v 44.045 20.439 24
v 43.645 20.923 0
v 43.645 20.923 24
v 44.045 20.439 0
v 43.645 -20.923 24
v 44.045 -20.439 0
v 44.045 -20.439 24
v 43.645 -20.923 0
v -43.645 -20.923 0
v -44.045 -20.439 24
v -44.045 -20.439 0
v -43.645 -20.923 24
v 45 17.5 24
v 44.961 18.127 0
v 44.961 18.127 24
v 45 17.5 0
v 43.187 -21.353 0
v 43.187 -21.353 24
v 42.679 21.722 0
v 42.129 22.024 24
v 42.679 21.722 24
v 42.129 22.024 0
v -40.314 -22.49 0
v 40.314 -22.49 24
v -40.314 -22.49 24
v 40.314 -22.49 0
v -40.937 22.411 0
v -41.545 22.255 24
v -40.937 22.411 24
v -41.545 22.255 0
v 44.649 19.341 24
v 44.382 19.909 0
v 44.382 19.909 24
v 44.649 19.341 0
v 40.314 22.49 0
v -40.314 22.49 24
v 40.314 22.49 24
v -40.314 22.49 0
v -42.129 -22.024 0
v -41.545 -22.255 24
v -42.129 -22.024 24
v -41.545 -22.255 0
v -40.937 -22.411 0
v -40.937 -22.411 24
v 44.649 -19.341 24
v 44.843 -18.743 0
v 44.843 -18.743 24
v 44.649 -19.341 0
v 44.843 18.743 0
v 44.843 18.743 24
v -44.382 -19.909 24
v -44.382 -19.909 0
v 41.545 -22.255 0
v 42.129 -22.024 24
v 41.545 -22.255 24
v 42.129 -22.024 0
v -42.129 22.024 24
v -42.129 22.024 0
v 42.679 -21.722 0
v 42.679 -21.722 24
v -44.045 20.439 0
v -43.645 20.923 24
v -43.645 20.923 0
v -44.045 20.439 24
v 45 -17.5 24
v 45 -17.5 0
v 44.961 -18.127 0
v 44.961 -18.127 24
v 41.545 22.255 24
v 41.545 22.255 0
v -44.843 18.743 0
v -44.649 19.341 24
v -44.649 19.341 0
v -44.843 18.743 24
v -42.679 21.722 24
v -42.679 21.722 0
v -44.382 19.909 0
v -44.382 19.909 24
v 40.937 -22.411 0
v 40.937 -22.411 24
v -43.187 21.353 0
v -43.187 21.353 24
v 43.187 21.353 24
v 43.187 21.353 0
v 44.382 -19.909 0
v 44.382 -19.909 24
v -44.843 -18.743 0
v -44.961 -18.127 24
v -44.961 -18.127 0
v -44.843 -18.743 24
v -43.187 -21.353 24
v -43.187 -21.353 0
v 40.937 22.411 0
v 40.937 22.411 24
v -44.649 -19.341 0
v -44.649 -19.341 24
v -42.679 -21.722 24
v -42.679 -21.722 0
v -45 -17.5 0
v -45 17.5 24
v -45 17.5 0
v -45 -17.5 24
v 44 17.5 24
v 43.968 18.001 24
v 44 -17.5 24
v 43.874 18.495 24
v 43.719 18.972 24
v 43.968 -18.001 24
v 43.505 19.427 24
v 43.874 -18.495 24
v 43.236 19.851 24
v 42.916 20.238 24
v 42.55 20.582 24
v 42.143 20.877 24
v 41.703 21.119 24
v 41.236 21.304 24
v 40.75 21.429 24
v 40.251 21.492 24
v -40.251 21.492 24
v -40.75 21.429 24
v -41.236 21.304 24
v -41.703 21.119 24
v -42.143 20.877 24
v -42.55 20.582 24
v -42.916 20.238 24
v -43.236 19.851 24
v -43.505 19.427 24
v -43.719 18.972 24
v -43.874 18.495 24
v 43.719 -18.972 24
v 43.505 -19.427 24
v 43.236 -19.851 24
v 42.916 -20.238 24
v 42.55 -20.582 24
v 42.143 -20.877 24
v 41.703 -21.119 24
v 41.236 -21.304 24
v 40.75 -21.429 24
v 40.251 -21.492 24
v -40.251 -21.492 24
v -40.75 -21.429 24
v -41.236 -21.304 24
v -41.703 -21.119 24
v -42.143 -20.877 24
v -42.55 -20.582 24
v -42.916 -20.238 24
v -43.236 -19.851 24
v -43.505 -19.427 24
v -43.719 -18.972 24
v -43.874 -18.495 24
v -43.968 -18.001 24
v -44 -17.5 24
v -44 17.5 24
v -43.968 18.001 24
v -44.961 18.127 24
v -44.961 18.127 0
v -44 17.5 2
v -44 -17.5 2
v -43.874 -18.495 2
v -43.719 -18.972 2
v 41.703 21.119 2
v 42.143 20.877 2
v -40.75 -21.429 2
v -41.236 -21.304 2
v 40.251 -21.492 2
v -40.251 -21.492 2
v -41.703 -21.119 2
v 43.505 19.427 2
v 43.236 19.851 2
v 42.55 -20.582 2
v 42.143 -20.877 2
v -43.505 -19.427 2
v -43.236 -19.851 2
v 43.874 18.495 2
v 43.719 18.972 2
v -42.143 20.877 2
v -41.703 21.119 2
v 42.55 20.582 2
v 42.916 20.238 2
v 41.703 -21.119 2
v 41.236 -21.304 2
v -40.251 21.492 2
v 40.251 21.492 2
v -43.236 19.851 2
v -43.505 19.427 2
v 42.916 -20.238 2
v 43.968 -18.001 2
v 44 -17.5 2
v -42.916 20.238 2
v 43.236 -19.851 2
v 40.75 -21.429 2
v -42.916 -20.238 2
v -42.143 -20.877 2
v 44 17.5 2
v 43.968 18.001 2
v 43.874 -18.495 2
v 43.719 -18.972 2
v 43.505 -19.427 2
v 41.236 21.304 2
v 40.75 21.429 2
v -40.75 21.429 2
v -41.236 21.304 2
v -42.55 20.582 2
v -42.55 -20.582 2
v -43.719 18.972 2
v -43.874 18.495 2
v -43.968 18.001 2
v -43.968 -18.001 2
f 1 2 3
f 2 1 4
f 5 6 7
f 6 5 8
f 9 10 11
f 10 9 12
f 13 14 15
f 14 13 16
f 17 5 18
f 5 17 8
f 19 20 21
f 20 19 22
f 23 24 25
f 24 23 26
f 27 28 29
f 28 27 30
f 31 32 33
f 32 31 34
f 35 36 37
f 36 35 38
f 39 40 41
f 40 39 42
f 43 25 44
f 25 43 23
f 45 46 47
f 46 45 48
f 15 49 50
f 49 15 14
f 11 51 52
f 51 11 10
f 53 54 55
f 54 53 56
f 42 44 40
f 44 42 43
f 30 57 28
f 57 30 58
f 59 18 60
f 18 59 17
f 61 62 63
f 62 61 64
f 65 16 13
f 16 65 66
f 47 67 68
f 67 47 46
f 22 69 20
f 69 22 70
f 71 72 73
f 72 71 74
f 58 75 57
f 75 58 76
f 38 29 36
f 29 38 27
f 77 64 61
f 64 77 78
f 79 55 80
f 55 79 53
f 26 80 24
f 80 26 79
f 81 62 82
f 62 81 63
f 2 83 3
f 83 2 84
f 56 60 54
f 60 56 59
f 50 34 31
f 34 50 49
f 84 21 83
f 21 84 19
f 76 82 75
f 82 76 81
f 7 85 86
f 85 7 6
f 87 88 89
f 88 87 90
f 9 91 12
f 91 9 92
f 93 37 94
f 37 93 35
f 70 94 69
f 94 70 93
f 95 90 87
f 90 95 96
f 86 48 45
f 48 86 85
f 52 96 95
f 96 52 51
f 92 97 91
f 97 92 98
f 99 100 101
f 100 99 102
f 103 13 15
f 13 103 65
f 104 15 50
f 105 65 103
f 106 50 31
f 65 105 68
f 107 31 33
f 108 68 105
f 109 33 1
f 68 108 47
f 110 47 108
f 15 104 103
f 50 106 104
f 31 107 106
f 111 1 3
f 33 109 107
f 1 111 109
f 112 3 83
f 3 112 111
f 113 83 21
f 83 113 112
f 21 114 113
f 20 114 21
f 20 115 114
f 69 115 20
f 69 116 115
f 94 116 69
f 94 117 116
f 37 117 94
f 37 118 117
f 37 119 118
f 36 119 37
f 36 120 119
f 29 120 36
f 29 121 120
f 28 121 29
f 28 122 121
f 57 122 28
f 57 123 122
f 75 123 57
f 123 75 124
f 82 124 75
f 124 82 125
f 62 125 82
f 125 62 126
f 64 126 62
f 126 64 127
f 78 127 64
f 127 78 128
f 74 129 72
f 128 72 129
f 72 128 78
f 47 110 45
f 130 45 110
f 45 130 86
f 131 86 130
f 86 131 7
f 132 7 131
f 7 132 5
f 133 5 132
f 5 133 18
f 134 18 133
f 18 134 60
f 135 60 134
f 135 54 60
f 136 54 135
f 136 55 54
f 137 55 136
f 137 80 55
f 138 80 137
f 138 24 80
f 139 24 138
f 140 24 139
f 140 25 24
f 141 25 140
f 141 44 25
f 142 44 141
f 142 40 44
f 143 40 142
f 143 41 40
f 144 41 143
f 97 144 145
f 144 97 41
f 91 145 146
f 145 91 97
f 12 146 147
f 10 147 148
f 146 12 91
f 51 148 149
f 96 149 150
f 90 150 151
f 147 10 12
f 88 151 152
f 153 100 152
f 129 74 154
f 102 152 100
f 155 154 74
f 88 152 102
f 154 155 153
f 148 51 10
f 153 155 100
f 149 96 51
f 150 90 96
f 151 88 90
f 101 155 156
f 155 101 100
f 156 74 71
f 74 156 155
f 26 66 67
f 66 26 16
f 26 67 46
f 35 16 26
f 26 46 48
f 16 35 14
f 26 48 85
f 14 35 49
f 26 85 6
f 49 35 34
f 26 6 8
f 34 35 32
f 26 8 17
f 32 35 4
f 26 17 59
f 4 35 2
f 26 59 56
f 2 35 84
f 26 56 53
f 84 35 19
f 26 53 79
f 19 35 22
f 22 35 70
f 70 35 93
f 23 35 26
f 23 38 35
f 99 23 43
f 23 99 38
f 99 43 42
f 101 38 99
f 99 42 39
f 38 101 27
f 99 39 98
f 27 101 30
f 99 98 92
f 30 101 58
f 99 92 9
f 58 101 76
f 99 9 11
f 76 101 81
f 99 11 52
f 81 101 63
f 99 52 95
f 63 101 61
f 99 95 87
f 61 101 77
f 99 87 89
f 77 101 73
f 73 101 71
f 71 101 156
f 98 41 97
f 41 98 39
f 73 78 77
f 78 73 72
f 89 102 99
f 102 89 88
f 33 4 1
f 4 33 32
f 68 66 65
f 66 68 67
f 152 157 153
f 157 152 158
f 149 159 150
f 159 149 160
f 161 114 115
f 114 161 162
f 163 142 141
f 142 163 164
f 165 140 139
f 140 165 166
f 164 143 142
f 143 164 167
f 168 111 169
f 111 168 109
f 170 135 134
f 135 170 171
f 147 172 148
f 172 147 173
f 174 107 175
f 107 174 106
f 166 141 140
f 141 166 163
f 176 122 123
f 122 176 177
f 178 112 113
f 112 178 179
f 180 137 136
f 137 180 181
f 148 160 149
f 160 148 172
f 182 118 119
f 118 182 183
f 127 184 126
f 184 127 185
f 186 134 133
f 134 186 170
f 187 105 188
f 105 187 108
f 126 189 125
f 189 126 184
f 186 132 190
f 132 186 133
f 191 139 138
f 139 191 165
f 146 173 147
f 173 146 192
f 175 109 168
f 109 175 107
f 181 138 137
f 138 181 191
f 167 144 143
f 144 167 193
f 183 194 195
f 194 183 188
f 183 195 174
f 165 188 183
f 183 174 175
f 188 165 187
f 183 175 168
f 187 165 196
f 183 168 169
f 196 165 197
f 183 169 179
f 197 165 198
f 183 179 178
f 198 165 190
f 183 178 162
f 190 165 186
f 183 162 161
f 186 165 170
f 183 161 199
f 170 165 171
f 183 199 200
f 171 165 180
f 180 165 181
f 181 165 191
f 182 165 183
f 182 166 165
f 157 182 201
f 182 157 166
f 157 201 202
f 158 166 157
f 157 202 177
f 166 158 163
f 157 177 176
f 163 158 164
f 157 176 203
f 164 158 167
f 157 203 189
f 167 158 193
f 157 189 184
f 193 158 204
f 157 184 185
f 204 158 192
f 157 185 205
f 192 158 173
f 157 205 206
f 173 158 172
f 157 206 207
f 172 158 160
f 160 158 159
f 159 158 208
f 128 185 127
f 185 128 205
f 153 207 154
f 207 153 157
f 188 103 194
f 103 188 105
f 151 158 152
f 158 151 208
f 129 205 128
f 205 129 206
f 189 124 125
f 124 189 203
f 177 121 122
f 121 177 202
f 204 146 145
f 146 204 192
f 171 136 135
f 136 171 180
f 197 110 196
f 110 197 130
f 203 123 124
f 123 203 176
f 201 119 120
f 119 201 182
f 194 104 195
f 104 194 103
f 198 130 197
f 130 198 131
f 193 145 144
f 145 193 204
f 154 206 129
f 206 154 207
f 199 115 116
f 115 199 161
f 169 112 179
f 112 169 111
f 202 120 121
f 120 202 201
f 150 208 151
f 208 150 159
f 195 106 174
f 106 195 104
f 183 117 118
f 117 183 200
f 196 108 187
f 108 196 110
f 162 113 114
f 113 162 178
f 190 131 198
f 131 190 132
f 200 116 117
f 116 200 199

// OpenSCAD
$fn = 50;


difference() {
	union() {
		hull() {
			translate(v = [-40.0000000000, 17.5000000000, 0]) {
				cylinder(h = 24, r = 5);
			}
			translate(v = [40.0000000000, 17.5000000000, 0]) {
				cylinder(h = 24, r = 5);
			}
			translate(v = [-40.0000000000, -17.5000000000, 0]) {
				cylinder(h = 24, r = 5);
			}
			translate(v = [40.0000000000, -17.5000000000, 0]) {
				cylinder(h = 24, r = 5);
			}
		}
	}
	union() {
		translate(v = [0, 0, 2]) {
			hull() {
				translate(v = [-40.0000000000, 17.5000000000, 0]) {
					cylinder(h = 22, r = 4);
				}
				translate(v = [40.0000000000, 17.5000000000, 0]) {
					cylinder(h = 22, r = 4);
				}
				translate(v = [-40.0000000000, -17.5000000000, 0]) {
					cylinder(h = 22, r = 4);
				}
				translate(v = [40.0000000000, -17.5000000000, 0]) {
					cylinder(h = 22, r = 4);
				}
			}
		}
	}
}
